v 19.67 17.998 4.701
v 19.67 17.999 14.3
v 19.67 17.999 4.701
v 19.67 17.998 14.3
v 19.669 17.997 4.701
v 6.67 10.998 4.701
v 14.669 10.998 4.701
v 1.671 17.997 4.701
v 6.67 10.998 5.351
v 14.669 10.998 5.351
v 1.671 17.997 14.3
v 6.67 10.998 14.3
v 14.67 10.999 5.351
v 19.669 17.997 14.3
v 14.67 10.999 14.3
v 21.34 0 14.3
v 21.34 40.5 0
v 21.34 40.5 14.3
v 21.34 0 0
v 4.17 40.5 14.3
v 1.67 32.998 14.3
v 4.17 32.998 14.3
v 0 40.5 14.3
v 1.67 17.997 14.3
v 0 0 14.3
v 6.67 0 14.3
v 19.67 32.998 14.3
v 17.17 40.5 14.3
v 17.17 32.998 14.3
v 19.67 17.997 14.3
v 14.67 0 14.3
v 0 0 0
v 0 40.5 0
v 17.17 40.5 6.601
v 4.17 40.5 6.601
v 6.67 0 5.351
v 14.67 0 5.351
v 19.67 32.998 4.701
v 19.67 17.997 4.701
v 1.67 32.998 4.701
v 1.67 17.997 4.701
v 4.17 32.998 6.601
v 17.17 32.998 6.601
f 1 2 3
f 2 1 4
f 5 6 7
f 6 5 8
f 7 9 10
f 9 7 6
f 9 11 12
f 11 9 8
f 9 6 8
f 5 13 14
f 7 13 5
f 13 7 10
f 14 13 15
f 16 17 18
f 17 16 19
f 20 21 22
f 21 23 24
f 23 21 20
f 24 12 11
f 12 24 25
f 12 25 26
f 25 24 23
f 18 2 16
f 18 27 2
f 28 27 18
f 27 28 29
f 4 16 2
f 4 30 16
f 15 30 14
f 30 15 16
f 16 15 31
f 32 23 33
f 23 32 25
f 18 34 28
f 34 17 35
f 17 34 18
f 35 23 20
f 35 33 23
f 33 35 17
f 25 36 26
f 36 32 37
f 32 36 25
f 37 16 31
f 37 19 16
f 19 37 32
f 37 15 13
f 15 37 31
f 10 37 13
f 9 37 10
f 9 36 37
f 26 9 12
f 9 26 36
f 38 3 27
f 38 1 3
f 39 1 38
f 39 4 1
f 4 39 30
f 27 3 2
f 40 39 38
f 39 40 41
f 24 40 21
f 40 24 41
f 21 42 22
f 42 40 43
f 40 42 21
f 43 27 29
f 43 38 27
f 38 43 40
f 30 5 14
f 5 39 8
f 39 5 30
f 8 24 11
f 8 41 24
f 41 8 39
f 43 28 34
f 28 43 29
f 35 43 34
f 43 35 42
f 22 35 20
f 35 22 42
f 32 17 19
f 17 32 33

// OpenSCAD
// -----------------------------------------------------------------------------
// 3D-Model (OpenSCAD) of USB-connector
//
// Author: Bernhard Bablok
// License: GPL3
//
// Website: https://github.com/bablokb/pi-webradio
//
// -----------------------------------------------------------------------------

$fa = 1;
$fs = 0.4;

fuzz = 0.001;

use <MCAD/triangles.scad>

module prism(x,y,h) {
  triangle(y,x,h);
}

module trapez() {
  difference() {
    cube([18,7+fuzz,9.6]);
    prism(5,7+fuzz,9.6);
    translate([5+13,0,0]) rotate([0,0,90]) prism(7,5+fuzz,9.6);
  }
}

module usb_conn() {
  // base
  cube([21.34,40.5,4.7]);

  // upper-part
  difference() {
    color("blue") translate([0,0,4.7]) cube([21.34,40.5,9.6]);
    translate([6.67,0-fuzz,5.35+fuzz]) cube([8,11+fuzz,8.95]);
    translate([1.67,11-2*fuzz,4.7+fuzz]) trapez();
    translate([1.67,11+7-3*fuzz,4.7+fuzz]) cube([18,15+fuzz,9.6]);
    translate([4.17,11+7+15-4*fuzz,6.6+fuzz]) cube([13,7.5+5*fuzz,7.7]);
  }
}

usb_conn();
